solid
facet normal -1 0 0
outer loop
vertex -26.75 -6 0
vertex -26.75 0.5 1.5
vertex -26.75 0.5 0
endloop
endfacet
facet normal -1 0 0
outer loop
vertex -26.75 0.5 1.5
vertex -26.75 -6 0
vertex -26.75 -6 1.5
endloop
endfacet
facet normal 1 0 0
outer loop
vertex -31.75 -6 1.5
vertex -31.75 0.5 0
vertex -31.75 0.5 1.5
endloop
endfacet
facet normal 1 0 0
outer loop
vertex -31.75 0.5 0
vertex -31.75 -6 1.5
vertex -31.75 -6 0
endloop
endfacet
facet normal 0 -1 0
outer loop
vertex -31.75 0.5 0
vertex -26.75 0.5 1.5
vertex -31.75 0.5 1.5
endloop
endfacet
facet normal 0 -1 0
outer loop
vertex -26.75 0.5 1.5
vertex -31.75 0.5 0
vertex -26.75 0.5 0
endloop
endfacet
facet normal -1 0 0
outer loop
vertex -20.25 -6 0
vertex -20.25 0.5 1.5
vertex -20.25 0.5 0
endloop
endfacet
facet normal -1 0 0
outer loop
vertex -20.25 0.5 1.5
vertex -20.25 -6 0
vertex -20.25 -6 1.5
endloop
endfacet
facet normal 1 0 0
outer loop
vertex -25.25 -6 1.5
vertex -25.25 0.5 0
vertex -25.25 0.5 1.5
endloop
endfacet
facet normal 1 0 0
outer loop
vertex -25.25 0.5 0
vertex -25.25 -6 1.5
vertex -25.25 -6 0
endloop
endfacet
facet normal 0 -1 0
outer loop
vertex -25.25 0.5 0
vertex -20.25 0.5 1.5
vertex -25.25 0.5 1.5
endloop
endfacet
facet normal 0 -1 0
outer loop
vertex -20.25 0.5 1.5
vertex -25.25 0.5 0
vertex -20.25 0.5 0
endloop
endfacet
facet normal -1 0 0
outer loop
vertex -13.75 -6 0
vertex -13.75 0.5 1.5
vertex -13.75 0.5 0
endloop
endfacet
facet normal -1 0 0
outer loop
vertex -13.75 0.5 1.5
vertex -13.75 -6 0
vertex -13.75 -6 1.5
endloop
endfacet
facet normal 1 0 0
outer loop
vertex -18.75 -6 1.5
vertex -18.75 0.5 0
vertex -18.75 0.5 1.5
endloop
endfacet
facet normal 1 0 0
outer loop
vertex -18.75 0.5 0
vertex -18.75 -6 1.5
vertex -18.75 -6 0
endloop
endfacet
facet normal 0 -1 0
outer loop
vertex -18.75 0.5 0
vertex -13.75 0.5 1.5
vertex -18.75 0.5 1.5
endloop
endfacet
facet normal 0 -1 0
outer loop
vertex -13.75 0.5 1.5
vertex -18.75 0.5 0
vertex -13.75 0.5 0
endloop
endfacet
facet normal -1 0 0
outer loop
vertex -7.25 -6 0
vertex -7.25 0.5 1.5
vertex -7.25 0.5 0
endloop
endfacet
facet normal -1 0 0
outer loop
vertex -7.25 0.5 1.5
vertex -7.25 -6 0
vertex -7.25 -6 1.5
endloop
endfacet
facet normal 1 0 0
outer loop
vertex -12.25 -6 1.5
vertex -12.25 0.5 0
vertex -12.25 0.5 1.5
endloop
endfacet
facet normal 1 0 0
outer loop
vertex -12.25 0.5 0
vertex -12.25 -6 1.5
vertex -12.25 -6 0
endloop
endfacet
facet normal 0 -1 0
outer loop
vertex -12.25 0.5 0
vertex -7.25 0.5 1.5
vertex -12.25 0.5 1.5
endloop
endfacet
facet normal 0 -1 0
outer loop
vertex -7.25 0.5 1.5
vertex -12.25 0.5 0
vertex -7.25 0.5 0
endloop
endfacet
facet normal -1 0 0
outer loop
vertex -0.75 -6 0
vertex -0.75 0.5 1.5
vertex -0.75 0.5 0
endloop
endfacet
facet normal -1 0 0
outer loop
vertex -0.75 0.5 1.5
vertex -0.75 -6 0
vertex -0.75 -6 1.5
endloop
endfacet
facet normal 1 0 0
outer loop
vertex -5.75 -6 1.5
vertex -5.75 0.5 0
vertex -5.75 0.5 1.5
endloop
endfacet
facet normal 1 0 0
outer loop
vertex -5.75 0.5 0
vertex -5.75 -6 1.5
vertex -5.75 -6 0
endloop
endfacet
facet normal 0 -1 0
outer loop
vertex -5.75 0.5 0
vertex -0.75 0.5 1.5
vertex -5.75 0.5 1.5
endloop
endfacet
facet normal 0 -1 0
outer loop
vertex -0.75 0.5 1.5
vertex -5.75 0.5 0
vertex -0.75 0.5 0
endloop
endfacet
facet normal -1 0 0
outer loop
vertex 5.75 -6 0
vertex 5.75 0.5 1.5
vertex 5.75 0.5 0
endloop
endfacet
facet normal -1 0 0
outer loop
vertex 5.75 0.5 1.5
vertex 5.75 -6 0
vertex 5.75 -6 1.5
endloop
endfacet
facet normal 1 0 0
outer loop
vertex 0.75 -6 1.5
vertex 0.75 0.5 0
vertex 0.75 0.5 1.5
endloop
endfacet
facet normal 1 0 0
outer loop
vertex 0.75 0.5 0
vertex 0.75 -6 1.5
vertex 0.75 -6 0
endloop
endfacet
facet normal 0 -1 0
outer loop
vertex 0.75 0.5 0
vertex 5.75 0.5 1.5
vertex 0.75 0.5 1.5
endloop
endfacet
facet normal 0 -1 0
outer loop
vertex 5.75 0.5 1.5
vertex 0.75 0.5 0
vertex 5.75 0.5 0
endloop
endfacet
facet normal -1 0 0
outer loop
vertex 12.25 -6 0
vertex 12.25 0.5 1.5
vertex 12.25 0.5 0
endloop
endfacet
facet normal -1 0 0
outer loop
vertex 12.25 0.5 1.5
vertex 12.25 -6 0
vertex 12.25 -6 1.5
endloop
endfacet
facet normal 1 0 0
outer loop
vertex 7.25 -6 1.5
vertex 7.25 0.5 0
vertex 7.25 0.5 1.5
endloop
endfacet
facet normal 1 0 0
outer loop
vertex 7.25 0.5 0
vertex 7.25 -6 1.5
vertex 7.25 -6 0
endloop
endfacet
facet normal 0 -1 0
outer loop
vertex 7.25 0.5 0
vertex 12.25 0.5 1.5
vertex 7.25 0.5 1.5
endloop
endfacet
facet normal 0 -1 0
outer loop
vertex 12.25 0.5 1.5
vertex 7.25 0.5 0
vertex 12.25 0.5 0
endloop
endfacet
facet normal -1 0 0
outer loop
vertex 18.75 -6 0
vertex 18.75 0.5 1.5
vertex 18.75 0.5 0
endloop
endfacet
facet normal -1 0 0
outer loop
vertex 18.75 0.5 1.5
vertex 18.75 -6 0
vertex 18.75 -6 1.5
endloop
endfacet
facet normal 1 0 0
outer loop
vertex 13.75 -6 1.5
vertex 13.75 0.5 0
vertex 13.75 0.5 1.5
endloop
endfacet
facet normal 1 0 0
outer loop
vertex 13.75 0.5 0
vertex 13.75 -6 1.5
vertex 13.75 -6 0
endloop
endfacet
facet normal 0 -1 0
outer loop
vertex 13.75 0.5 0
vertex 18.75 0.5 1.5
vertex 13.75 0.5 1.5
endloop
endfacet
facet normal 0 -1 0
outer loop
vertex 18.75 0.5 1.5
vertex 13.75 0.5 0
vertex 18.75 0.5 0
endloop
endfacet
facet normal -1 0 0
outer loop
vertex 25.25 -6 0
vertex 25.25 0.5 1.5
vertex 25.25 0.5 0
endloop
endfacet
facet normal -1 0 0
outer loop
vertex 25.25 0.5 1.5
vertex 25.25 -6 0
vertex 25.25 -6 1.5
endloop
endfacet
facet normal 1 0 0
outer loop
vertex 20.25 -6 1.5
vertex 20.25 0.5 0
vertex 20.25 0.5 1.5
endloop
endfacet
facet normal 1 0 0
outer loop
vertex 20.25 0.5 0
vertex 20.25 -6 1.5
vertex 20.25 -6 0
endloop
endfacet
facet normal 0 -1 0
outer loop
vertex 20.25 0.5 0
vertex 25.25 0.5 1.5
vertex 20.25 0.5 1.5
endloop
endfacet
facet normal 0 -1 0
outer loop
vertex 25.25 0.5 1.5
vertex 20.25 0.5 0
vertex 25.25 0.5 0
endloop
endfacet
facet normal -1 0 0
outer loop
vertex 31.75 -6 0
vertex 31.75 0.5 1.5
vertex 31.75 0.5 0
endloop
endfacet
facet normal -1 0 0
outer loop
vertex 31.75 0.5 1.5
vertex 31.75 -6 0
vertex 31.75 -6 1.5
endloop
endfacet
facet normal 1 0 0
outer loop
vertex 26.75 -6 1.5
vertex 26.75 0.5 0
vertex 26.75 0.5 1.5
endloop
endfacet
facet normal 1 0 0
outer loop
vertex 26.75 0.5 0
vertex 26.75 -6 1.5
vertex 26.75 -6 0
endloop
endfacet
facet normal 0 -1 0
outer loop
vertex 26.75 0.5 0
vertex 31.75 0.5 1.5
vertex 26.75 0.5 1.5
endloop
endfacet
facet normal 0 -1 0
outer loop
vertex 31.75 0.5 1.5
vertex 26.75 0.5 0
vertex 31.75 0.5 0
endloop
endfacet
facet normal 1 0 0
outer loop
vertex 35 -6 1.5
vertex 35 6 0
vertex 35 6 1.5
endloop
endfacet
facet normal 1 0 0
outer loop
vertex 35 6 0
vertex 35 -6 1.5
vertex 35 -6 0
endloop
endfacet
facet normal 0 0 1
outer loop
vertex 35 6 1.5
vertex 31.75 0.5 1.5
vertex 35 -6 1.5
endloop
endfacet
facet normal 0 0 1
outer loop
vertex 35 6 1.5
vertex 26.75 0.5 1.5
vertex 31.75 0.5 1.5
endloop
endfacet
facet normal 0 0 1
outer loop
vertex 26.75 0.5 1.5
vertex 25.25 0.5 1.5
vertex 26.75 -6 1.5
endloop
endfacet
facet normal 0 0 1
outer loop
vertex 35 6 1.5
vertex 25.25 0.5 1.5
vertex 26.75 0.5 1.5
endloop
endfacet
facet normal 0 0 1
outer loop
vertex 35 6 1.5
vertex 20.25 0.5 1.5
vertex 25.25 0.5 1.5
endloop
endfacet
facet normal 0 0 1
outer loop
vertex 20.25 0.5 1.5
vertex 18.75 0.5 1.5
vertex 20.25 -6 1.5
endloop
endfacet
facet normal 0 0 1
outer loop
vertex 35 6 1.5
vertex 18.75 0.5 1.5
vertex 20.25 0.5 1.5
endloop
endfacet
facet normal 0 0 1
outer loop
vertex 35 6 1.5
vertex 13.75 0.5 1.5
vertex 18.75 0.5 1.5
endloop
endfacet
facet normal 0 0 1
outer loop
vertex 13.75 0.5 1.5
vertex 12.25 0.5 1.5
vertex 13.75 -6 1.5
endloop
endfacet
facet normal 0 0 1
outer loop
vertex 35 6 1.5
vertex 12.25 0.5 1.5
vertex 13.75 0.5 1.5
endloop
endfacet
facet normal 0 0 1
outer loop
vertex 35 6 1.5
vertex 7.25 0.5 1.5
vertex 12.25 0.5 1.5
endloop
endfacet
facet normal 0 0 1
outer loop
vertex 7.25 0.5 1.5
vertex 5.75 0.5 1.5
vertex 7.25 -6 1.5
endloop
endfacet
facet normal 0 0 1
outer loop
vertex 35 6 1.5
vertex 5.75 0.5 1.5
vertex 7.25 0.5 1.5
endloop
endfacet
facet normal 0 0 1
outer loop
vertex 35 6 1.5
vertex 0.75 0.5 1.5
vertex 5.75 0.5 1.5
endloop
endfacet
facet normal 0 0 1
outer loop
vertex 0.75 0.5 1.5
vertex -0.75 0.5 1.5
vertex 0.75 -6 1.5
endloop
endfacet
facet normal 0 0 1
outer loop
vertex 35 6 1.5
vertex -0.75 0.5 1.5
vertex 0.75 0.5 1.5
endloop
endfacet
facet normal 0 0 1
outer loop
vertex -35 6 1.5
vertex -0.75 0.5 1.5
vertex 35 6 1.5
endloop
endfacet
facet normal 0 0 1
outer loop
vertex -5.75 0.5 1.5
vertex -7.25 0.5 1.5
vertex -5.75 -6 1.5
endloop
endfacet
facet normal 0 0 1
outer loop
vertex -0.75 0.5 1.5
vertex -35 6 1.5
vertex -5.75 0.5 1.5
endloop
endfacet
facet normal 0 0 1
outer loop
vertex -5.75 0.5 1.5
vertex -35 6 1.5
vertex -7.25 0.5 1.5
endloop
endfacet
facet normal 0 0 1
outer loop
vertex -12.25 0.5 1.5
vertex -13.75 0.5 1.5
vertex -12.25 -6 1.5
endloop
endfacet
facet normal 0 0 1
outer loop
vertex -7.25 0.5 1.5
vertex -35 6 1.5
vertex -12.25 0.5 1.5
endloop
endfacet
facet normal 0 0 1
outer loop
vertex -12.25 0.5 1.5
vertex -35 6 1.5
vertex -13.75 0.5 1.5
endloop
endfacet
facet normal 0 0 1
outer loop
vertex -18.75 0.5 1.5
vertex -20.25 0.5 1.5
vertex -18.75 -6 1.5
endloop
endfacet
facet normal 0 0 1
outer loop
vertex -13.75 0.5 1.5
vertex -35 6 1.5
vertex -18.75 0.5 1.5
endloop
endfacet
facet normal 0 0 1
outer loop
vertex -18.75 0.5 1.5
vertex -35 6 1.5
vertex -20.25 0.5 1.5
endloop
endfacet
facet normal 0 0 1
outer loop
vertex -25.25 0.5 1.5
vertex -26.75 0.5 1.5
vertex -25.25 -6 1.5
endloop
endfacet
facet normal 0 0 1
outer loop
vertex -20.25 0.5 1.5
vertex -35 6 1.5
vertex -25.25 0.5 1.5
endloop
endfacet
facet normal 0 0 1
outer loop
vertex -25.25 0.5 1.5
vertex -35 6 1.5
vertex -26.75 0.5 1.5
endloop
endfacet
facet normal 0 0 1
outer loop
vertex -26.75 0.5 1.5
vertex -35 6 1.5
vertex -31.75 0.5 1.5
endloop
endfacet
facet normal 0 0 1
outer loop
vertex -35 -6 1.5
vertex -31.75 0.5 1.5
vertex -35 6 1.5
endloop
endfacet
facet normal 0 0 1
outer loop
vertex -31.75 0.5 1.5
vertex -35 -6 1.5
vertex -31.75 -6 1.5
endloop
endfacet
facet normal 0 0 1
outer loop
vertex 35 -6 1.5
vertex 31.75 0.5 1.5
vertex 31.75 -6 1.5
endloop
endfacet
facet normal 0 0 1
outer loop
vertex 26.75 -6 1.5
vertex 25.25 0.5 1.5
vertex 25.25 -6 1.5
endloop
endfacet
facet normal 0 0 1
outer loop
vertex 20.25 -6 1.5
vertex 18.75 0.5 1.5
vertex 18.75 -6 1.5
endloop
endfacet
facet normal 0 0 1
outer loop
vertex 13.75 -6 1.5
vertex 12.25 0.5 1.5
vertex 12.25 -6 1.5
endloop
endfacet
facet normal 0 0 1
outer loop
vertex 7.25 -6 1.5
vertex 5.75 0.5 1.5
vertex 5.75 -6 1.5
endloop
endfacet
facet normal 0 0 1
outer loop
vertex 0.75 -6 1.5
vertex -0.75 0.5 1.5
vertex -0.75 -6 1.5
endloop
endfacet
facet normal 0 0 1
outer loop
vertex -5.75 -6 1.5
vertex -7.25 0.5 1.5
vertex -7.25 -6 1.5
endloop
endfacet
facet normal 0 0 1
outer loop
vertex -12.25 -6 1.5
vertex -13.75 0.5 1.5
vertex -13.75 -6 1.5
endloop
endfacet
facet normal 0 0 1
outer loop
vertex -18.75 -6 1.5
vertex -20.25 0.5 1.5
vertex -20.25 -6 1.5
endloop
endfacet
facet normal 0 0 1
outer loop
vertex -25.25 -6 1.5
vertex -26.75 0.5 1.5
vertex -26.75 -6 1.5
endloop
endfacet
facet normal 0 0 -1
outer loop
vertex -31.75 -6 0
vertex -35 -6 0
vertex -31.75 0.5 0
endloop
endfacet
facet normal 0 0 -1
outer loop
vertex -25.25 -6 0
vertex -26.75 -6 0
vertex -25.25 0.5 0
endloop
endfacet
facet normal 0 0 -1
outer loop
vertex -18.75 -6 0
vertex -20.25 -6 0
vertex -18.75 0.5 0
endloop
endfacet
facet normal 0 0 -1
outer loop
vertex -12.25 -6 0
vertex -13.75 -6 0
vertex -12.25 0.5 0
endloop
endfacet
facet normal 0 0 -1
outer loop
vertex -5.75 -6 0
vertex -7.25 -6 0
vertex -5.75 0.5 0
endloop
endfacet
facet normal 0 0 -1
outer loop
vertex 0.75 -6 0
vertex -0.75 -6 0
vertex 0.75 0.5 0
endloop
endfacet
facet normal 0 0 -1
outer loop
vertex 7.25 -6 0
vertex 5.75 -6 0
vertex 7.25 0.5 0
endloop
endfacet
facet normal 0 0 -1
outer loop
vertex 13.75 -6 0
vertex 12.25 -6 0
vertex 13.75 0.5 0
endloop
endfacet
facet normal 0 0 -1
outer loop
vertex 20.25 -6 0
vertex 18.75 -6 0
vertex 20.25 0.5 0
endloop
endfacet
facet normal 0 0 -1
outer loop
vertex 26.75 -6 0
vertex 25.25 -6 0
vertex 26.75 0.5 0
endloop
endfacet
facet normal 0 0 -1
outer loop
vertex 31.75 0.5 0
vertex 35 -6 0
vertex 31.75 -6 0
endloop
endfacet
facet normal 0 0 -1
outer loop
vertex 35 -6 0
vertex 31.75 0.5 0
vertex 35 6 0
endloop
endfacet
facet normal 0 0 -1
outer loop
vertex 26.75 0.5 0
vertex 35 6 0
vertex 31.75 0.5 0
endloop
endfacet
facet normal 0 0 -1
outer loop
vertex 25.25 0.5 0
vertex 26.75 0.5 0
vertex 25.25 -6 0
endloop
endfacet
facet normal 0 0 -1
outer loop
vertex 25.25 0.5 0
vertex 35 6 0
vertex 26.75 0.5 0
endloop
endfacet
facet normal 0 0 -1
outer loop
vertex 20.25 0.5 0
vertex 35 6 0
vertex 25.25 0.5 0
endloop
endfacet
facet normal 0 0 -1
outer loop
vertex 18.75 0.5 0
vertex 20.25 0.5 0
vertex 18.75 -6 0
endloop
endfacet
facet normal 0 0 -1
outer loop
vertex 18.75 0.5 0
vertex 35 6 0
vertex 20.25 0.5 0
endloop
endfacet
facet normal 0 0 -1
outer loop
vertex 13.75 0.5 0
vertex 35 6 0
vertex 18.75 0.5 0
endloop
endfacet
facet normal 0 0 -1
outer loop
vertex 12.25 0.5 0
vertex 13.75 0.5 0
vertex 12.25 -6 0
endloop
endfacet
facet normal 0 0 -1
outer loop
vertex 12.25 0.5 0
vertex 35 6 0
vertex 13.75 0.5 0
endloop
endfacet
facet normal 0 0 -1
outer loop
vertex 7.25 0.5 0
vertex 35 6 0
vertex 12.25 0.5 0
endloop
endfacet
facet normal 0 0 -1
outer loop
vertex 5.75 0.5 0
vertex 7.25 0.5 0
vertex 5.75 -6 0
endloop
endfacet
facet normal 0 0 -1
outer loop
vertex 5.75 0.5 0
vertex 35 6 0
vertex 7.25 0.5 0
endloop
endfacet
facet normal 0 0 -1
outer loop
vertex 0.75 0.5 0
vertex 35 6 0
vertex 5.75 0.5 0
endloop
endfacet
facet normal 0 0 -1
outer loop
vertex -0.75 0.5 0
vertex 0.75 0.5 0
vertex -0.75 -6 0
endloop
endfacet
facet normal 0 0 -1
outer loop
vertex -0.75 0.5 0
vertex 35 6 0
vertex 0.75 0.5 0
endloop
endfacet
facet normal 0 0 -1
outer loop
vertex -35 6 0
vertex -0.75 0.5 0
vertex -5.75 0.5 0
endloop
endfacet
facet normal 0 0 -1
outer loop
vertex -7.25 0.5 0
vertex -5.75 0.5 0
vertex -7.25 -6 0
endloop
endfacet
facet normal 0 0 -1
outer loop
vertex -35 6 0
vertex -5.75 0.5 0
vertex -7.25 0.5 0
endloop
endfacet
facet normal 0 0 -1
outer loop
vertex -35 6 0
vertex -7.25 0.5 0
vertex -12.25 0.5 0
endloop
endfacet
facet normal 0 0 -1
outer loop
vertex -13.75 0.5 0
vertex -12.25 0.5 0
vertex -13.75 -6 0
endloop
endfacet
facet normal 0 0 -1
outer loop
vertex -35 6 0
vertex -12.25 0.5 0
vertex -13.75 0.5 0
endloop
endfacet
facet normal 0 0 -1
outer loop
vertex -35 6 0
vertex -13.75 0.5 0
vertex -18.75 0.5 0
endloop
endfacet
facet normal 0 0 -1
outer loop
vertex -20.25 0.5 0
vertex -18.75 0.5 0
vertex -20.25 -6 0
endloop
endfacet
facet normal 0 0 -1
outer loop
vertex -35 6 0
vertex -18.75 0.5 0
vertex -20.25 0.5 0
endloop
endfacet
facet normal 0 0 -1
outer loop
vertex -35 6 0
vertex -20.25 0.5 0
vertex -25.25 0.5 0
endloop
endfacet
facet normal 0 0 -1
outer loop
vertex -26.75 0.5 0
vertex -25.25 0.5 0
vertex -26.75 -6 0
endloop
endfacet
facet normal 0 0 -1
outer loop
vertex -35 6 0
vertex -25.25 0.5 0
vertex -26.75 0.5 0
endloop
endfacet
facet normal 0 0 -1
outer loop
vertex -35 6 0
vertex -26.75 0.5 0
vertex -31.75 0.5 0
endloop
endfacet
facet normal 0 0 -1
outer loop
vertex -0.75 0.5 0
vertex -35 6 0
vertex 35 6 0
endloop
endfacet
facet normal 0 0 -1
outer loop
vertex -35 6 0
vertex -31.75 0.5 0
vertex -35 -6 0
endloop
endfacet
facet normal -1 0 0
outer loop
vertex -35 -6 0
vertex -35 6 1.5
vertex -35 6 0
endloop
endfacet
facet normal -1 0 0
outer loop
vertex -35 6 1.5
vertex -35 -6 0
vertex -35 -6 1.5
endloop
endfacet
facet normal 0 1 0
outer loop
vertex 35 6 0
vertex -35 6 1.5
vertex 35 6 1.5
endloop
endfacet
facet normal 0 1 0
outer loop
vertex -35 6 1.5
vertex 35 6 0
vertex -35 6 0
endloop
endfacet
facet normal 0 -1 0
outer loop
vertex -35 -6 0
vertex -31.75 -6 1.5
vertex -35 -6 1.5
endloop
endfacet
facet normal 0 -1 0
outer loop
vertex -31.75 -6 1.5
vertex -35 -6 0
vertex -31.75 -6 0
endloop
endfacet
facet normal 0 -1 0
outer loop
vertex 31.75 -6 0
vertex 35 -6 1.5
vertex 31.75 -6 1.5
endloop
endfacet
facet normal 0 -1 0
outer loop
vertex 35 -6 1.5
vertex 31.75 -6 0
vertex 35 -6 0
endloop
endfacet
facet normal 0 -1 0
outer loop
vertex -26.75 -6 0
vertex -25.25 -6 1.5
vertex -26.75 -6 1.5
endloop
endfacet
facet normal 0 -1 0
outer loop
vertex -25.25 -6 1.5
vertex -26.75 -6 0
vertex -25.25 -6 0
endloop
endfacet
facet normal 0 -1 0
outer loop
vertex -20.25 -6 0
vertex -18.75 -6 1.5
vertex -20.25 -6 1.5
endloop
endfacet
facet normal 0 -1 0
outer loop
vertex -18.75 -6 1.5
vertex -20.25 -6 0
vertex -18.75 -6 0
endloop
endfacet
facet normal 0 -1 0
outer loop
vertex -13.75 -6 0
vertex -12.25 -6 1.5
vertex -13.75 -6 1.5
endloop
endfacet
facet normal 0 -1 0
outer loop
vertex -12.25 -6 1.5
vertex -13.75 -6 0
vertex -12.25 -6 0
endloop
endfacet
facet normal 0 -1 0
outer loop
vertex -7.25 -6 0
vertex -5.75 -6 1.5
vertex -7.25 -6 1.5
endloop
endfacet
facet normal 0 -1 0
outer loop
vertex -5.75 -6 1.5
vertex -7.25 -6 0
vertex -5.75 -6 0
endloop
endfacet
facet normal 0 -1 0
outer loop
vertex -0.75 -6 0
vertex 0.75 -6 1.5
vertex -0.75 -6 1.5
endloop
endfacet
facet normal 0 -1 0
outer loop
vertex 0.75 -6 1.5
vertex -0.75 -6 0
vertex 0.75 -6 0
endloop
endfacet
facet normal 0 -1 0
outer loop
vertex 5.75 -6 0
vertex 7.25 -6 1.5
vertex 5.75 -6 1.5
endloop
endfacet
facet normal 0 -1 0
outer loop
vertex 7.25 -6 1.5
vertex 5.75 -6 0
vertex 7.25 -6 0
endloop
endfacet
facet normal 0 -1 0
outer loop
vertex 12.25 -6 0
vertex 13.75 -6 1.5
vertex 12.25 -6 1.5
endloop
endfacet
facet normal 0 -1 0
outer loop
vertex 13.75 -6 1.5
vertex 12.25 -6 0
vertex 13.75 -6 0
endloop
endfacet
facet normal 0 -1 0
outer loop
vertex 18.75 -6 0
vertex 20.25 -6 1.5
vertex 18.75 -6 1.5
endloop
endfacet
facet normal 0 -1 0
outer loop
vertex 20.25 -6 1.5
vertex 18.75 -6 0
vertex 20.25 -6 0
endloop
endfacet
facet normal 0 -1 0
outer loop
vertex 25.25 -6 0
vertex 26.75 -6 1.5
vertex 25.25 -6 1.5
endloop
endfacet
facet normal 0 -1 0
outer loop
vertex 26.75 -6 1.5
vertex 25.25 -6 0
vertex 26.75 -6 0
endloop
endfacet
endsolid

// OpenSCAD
// 10-well agarose gel comb, printed lying flat
// Units: mm. Teeth hang from the spine in -Y.

plate_t      = 1.5;   // plate thickness (Z)
spine_len    = 70;    // spine length (X)
spine_w      = 12;    // spine width (Y)
teeth_n      = 10;    // number of teeth
teeth_w      = 5;     // tooth width (X)
teeth_l      = 12;    // tooth length (Y)
teeth_gap    = 1.5;   // gap between teeth (X)
overcut      = 0.5;   // cutter overshoot past faces

$fn = 64;

pitch = teeth_w + teeth_gap;              // 6.5 mm
x0    = -(teeth_n - 1) * pitch / 2;       // first tooth centre

difference() {
    // Spine
    translate([-spine_len / 2, -spine_w / 2, 0])
        cube([spine_len, spine_w, plate_t]);

    // Teeth
    for (i = [0 : teeth_n - 1])
        translate([x0 + i * pitch - teeth_w / 2,
                   -spine_w / 2 - teeth_l,
                   -overcut])
            cube([teeth_w, teeth_l + spine_w / 2 + overcut, plate_t + 2 * overcut]);
}
